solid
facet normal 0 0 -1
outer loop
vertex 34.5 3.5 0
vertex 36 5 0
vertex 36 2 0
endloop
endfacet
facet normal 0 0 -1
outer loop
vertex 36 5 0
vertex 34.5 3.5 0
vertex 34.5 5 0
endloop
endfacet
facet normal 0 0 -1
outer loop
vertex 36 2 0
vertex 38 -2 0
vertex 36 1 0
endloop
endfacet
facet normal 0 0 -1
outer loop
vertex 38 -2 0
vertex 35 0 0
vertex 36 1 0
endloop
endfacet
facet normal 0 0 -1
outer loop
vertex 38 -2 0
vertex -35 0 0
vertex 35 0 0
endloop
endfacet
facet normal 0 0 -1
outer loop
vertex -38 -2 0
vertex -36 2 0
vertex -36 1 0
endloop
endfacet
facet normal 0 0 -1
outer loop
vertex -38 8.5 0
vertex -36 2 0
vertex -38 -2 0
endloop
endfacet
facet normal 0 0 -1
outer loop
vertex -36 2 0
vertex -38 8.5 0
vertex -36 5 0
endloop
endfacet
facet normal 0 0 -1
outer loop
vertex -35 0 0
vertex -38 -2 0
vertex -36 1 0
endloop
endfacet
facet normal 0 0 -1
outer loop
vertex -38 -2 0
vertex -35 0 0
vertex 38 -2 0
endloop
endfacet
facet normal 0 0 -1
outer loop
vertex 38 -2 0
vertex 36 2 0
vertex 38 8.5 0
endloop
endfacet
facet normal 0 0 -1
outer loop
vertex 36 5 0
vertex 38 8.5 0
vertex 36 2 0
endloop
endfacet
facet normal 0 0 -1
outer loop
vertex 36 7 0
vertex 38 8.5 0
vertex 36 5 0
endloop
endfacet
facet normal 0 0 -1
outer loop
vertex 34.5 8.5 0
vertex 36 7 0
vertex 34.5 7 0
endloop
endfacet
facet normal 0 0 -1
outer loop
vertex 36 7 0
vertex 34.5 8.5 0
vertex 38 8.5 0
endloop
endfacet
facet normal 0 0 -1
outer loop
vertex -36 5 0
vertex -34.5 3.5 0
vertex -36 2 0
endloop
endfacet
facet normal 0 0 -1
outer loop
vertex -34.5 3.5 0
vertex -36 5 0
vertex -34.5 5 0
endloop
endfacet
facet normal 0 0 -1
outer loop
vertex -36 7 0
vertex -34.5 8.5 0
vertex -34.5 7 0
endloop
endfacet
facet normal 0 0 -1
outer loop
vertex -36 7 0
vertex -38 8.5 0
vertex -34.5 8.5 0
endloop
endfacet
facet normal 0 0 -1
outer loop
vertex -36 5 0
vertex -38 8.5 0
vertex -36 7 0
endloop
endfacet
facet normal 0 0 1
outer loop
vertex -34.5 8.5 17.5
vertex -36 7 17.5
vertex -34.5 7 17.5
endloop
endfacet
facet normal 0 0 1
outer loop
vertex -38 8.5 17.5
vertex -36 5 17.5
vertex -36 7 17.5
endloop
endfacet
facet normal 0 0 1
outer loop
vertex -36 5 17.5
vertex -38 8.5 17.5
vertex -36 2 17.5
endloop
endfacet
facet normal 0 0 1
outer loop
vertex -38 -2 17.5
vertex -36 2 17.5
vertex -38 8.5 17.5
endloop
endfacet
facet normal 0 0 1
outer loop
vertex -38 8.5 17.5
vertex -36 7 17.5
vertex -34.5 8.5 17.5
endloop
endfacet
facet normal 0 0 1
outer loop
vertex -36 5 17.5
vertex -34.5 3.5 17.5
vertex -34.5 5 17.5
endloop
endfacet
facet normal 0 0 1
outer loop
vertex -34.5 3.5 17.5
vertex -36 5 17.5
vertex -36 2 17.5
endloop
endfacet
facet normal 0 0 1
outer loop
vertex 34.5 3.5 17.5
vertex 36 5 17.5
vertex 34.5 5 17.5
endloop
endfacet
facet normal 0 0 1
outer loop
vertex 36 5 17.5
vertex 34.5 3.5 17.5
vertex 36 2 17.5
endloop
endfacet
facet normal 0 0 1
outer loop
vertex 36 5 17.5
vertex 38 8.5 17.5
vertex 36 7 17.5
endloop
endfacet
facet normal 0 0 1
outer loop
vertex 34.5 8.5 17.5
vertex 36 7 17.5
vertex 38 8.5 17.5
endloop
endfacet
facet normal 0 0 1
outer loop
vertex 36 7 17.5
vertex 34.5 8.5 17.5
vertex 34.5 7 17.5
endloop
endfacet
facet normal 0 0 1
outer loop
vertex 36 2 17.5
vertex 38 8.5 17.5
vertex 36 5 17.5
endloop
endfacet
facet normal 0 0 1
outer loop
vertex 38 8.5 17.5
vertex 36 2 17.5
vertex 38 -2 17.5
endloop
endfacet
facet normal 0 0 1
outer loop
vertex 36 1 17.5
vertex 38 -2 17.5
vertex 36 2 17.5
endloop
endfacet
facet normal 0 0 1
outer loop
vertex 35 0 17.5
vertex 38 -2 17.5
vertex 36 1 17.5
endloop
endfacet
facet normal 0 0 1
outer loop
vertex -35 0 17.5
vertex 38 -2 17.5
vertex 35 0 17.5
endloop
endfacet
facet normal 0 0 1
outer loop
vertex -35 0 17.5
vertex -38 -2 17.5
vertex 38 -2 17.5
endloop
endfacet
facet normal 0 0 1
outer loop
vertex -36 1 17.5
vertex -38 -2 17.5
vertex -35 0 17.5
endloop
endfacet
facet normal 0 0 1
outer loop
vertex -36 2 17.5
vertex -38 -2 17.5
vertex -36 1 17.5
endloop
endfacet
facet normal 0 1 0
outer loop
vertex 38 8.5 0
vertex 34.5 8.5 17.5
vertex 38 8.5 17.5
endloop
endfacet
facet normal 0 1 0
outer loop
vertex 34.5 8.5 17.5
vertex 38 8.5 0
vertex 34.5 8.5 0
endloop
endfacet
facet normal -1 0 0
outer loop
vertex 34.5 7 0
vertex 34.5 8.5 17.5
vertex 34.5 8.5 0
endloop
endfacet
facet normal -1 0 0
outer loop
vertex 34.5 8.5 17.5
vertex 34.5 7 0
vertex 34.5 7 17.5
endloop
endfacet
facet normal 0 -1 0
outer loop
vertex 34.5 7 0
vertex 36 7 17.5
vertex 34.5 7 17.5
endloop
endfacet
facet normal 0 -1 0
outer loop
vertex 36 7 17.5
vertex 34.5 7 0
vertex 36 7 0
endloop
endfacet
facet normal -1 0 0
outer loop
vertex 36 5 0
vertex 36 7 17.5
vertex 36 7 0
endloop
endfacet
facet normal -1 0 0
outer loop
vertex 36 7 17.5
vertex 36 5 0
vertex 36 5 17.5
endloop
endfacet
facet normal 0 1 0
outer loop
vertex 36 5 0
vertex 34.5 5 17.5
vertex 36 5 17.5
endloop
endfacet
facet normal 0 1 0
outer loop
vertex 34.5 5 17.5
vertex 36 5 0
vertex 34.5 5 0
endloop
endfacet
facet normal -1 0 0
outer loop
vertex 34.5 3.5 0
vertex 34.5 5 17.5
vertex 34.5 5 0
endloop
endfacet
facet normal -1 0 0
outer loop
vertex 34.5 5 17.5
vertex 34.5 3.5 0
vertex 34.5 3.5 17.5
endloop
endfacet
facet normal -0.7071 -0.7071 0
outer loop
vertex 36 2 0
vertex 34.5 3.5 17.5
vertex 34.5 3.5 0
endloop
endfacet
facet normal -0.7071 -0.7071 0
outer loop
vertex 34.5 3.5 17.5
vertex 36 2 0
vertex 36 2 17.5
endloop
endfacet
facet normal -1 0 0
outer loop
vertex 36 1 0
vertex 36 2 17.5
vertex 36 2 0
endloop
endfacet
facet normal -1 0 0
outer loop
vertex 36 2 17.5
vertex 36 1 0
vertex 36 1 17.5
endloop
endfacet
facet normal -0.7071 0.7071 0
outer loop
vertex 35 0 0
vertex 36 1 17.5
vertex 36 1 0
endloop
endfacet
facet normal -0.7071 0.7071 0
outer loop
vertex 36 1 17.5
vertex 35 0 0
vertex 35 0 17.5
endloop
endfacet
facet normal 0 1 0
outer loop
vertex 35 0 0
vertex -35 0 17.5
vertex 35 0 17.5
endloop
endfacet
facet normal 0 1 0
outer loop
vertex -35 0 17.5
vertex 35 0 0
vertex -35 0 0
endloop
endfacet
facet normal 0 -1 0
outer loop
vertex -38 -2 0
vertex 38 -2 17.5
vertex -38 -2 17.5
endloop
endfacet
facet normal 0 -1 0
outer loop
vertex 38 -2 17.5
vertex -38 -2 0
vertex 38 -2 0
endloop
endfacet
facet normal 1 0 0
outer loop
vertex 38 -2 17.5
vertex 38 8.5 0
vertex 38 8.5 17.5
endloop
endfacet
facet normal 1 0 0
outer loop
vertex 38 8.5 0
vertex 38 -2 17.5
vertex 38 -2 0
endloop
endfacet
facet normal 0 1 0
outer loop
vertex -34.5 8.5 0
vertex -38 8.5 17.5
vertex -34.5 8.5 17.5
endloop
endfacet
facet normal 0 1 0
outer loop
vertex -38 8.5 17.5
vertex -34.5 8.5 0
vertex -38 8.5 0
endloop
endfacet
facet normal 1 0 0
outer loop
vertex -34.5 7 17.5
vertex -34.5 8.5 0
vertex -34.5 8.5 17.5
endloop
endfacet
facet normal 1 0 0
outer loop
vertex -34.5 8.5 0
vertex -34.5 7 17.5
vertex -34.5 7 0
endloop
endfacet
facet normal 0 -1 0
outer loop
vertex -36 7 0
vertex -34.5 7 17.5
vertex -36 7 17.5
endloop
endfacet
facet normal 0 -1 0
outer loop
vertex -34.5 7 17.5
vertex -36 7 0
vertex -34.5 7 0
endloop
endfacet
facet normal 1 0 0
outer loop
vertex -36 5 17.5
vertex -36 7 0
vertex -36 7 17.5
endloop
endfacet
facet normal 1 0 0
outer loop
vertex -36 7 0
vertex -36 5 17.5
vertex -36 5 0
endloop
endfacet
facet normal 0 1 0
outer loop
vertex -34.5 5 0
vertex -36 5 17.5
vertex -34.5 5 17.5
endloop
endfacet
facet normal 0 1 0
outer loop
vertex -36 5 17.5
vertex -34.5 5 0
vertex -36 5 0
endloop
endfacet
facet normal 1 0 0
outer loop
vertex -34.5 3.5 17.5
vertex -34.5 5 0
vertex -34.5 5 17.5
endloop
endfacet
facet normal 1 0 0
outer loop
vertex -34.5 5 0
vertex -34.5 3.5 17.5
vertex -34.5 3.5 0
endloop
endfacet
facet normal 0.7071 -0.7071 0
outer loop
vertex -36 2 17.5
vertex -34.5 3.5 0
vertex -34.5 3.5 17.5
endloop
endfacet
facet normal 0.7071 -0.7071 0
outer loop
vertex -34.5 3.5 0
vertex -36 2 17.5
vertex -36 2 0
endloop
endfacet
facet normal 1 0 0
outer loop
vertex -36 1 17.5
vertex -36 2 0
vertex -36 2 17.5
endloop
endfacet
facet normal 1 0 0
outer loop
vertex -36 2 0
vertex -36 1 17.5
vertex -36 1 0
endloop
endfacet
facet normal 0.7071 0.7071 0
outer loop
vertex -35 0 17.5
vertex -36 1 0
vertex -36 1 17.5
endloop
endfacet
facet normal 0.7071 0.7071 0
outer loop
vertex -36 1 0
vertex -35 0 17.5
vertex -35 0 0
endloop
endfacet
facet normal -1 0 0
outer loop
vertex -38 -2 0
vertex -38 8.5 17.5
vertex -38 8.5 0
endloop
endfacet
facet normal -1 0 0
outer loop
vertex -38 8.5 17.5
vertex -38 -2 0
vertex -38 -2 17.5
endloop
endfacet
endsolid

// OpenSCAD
$fn = 30;

/* [Din] */
modules = 1; // [0.5, 1, 1.5, 2]
/* [Pcb] */
height = 72;
thickness = 2;


module slide(lenght=10, height=72, thickness=1.5) {
    bottom_space = 5;
    bottom_x = height / 2;
    slide_thickness = 2;
    ledge_size = 1.5;
    ledge_thickness = 1.5;
    ledge_chamfer_x = bottom_x;
    ledge_chamfer_y = bottom_space - ledge_thickness - ledge_size;
    ledge_x = bottom_x - ledge_size;
    ledge_y = bottom_space - ledge_thickness;

    module half_slide() {
        linear_extrude(height=lenght) {
            polygon(points=[
                [0, -slide_thickness],
                [0, 0],
                [bottom_x - 1, 0],
                [bottom_x, 1],
                [bottom_x, bottom_space],
                [ledge_chamfer_x, ledge_chamfer_y],
                [ledge_x, ledge_y],
                [ledge_x, bottom_space],
                [bottom_x, bottom_space],
                [bottom_x, bottom_space + thickness],
                [ledge_x, bottom_space + thickness],
                [ledge_x, bottom_space + thickness + ledge_thickness],
                [bottom_x + slide_thickness, bottom_space + thickness + ledge_thickness],
                [bottom_x + slide_thickness, -slide_thickness],
                [0, -slide_thickness],
            ]);
        }
    }

    half_slide();
    mirror([1,0,0]) {
        half_slide();
    }
}


slide(lenght=modules * 17.5, height=height, thickness=thickness);
